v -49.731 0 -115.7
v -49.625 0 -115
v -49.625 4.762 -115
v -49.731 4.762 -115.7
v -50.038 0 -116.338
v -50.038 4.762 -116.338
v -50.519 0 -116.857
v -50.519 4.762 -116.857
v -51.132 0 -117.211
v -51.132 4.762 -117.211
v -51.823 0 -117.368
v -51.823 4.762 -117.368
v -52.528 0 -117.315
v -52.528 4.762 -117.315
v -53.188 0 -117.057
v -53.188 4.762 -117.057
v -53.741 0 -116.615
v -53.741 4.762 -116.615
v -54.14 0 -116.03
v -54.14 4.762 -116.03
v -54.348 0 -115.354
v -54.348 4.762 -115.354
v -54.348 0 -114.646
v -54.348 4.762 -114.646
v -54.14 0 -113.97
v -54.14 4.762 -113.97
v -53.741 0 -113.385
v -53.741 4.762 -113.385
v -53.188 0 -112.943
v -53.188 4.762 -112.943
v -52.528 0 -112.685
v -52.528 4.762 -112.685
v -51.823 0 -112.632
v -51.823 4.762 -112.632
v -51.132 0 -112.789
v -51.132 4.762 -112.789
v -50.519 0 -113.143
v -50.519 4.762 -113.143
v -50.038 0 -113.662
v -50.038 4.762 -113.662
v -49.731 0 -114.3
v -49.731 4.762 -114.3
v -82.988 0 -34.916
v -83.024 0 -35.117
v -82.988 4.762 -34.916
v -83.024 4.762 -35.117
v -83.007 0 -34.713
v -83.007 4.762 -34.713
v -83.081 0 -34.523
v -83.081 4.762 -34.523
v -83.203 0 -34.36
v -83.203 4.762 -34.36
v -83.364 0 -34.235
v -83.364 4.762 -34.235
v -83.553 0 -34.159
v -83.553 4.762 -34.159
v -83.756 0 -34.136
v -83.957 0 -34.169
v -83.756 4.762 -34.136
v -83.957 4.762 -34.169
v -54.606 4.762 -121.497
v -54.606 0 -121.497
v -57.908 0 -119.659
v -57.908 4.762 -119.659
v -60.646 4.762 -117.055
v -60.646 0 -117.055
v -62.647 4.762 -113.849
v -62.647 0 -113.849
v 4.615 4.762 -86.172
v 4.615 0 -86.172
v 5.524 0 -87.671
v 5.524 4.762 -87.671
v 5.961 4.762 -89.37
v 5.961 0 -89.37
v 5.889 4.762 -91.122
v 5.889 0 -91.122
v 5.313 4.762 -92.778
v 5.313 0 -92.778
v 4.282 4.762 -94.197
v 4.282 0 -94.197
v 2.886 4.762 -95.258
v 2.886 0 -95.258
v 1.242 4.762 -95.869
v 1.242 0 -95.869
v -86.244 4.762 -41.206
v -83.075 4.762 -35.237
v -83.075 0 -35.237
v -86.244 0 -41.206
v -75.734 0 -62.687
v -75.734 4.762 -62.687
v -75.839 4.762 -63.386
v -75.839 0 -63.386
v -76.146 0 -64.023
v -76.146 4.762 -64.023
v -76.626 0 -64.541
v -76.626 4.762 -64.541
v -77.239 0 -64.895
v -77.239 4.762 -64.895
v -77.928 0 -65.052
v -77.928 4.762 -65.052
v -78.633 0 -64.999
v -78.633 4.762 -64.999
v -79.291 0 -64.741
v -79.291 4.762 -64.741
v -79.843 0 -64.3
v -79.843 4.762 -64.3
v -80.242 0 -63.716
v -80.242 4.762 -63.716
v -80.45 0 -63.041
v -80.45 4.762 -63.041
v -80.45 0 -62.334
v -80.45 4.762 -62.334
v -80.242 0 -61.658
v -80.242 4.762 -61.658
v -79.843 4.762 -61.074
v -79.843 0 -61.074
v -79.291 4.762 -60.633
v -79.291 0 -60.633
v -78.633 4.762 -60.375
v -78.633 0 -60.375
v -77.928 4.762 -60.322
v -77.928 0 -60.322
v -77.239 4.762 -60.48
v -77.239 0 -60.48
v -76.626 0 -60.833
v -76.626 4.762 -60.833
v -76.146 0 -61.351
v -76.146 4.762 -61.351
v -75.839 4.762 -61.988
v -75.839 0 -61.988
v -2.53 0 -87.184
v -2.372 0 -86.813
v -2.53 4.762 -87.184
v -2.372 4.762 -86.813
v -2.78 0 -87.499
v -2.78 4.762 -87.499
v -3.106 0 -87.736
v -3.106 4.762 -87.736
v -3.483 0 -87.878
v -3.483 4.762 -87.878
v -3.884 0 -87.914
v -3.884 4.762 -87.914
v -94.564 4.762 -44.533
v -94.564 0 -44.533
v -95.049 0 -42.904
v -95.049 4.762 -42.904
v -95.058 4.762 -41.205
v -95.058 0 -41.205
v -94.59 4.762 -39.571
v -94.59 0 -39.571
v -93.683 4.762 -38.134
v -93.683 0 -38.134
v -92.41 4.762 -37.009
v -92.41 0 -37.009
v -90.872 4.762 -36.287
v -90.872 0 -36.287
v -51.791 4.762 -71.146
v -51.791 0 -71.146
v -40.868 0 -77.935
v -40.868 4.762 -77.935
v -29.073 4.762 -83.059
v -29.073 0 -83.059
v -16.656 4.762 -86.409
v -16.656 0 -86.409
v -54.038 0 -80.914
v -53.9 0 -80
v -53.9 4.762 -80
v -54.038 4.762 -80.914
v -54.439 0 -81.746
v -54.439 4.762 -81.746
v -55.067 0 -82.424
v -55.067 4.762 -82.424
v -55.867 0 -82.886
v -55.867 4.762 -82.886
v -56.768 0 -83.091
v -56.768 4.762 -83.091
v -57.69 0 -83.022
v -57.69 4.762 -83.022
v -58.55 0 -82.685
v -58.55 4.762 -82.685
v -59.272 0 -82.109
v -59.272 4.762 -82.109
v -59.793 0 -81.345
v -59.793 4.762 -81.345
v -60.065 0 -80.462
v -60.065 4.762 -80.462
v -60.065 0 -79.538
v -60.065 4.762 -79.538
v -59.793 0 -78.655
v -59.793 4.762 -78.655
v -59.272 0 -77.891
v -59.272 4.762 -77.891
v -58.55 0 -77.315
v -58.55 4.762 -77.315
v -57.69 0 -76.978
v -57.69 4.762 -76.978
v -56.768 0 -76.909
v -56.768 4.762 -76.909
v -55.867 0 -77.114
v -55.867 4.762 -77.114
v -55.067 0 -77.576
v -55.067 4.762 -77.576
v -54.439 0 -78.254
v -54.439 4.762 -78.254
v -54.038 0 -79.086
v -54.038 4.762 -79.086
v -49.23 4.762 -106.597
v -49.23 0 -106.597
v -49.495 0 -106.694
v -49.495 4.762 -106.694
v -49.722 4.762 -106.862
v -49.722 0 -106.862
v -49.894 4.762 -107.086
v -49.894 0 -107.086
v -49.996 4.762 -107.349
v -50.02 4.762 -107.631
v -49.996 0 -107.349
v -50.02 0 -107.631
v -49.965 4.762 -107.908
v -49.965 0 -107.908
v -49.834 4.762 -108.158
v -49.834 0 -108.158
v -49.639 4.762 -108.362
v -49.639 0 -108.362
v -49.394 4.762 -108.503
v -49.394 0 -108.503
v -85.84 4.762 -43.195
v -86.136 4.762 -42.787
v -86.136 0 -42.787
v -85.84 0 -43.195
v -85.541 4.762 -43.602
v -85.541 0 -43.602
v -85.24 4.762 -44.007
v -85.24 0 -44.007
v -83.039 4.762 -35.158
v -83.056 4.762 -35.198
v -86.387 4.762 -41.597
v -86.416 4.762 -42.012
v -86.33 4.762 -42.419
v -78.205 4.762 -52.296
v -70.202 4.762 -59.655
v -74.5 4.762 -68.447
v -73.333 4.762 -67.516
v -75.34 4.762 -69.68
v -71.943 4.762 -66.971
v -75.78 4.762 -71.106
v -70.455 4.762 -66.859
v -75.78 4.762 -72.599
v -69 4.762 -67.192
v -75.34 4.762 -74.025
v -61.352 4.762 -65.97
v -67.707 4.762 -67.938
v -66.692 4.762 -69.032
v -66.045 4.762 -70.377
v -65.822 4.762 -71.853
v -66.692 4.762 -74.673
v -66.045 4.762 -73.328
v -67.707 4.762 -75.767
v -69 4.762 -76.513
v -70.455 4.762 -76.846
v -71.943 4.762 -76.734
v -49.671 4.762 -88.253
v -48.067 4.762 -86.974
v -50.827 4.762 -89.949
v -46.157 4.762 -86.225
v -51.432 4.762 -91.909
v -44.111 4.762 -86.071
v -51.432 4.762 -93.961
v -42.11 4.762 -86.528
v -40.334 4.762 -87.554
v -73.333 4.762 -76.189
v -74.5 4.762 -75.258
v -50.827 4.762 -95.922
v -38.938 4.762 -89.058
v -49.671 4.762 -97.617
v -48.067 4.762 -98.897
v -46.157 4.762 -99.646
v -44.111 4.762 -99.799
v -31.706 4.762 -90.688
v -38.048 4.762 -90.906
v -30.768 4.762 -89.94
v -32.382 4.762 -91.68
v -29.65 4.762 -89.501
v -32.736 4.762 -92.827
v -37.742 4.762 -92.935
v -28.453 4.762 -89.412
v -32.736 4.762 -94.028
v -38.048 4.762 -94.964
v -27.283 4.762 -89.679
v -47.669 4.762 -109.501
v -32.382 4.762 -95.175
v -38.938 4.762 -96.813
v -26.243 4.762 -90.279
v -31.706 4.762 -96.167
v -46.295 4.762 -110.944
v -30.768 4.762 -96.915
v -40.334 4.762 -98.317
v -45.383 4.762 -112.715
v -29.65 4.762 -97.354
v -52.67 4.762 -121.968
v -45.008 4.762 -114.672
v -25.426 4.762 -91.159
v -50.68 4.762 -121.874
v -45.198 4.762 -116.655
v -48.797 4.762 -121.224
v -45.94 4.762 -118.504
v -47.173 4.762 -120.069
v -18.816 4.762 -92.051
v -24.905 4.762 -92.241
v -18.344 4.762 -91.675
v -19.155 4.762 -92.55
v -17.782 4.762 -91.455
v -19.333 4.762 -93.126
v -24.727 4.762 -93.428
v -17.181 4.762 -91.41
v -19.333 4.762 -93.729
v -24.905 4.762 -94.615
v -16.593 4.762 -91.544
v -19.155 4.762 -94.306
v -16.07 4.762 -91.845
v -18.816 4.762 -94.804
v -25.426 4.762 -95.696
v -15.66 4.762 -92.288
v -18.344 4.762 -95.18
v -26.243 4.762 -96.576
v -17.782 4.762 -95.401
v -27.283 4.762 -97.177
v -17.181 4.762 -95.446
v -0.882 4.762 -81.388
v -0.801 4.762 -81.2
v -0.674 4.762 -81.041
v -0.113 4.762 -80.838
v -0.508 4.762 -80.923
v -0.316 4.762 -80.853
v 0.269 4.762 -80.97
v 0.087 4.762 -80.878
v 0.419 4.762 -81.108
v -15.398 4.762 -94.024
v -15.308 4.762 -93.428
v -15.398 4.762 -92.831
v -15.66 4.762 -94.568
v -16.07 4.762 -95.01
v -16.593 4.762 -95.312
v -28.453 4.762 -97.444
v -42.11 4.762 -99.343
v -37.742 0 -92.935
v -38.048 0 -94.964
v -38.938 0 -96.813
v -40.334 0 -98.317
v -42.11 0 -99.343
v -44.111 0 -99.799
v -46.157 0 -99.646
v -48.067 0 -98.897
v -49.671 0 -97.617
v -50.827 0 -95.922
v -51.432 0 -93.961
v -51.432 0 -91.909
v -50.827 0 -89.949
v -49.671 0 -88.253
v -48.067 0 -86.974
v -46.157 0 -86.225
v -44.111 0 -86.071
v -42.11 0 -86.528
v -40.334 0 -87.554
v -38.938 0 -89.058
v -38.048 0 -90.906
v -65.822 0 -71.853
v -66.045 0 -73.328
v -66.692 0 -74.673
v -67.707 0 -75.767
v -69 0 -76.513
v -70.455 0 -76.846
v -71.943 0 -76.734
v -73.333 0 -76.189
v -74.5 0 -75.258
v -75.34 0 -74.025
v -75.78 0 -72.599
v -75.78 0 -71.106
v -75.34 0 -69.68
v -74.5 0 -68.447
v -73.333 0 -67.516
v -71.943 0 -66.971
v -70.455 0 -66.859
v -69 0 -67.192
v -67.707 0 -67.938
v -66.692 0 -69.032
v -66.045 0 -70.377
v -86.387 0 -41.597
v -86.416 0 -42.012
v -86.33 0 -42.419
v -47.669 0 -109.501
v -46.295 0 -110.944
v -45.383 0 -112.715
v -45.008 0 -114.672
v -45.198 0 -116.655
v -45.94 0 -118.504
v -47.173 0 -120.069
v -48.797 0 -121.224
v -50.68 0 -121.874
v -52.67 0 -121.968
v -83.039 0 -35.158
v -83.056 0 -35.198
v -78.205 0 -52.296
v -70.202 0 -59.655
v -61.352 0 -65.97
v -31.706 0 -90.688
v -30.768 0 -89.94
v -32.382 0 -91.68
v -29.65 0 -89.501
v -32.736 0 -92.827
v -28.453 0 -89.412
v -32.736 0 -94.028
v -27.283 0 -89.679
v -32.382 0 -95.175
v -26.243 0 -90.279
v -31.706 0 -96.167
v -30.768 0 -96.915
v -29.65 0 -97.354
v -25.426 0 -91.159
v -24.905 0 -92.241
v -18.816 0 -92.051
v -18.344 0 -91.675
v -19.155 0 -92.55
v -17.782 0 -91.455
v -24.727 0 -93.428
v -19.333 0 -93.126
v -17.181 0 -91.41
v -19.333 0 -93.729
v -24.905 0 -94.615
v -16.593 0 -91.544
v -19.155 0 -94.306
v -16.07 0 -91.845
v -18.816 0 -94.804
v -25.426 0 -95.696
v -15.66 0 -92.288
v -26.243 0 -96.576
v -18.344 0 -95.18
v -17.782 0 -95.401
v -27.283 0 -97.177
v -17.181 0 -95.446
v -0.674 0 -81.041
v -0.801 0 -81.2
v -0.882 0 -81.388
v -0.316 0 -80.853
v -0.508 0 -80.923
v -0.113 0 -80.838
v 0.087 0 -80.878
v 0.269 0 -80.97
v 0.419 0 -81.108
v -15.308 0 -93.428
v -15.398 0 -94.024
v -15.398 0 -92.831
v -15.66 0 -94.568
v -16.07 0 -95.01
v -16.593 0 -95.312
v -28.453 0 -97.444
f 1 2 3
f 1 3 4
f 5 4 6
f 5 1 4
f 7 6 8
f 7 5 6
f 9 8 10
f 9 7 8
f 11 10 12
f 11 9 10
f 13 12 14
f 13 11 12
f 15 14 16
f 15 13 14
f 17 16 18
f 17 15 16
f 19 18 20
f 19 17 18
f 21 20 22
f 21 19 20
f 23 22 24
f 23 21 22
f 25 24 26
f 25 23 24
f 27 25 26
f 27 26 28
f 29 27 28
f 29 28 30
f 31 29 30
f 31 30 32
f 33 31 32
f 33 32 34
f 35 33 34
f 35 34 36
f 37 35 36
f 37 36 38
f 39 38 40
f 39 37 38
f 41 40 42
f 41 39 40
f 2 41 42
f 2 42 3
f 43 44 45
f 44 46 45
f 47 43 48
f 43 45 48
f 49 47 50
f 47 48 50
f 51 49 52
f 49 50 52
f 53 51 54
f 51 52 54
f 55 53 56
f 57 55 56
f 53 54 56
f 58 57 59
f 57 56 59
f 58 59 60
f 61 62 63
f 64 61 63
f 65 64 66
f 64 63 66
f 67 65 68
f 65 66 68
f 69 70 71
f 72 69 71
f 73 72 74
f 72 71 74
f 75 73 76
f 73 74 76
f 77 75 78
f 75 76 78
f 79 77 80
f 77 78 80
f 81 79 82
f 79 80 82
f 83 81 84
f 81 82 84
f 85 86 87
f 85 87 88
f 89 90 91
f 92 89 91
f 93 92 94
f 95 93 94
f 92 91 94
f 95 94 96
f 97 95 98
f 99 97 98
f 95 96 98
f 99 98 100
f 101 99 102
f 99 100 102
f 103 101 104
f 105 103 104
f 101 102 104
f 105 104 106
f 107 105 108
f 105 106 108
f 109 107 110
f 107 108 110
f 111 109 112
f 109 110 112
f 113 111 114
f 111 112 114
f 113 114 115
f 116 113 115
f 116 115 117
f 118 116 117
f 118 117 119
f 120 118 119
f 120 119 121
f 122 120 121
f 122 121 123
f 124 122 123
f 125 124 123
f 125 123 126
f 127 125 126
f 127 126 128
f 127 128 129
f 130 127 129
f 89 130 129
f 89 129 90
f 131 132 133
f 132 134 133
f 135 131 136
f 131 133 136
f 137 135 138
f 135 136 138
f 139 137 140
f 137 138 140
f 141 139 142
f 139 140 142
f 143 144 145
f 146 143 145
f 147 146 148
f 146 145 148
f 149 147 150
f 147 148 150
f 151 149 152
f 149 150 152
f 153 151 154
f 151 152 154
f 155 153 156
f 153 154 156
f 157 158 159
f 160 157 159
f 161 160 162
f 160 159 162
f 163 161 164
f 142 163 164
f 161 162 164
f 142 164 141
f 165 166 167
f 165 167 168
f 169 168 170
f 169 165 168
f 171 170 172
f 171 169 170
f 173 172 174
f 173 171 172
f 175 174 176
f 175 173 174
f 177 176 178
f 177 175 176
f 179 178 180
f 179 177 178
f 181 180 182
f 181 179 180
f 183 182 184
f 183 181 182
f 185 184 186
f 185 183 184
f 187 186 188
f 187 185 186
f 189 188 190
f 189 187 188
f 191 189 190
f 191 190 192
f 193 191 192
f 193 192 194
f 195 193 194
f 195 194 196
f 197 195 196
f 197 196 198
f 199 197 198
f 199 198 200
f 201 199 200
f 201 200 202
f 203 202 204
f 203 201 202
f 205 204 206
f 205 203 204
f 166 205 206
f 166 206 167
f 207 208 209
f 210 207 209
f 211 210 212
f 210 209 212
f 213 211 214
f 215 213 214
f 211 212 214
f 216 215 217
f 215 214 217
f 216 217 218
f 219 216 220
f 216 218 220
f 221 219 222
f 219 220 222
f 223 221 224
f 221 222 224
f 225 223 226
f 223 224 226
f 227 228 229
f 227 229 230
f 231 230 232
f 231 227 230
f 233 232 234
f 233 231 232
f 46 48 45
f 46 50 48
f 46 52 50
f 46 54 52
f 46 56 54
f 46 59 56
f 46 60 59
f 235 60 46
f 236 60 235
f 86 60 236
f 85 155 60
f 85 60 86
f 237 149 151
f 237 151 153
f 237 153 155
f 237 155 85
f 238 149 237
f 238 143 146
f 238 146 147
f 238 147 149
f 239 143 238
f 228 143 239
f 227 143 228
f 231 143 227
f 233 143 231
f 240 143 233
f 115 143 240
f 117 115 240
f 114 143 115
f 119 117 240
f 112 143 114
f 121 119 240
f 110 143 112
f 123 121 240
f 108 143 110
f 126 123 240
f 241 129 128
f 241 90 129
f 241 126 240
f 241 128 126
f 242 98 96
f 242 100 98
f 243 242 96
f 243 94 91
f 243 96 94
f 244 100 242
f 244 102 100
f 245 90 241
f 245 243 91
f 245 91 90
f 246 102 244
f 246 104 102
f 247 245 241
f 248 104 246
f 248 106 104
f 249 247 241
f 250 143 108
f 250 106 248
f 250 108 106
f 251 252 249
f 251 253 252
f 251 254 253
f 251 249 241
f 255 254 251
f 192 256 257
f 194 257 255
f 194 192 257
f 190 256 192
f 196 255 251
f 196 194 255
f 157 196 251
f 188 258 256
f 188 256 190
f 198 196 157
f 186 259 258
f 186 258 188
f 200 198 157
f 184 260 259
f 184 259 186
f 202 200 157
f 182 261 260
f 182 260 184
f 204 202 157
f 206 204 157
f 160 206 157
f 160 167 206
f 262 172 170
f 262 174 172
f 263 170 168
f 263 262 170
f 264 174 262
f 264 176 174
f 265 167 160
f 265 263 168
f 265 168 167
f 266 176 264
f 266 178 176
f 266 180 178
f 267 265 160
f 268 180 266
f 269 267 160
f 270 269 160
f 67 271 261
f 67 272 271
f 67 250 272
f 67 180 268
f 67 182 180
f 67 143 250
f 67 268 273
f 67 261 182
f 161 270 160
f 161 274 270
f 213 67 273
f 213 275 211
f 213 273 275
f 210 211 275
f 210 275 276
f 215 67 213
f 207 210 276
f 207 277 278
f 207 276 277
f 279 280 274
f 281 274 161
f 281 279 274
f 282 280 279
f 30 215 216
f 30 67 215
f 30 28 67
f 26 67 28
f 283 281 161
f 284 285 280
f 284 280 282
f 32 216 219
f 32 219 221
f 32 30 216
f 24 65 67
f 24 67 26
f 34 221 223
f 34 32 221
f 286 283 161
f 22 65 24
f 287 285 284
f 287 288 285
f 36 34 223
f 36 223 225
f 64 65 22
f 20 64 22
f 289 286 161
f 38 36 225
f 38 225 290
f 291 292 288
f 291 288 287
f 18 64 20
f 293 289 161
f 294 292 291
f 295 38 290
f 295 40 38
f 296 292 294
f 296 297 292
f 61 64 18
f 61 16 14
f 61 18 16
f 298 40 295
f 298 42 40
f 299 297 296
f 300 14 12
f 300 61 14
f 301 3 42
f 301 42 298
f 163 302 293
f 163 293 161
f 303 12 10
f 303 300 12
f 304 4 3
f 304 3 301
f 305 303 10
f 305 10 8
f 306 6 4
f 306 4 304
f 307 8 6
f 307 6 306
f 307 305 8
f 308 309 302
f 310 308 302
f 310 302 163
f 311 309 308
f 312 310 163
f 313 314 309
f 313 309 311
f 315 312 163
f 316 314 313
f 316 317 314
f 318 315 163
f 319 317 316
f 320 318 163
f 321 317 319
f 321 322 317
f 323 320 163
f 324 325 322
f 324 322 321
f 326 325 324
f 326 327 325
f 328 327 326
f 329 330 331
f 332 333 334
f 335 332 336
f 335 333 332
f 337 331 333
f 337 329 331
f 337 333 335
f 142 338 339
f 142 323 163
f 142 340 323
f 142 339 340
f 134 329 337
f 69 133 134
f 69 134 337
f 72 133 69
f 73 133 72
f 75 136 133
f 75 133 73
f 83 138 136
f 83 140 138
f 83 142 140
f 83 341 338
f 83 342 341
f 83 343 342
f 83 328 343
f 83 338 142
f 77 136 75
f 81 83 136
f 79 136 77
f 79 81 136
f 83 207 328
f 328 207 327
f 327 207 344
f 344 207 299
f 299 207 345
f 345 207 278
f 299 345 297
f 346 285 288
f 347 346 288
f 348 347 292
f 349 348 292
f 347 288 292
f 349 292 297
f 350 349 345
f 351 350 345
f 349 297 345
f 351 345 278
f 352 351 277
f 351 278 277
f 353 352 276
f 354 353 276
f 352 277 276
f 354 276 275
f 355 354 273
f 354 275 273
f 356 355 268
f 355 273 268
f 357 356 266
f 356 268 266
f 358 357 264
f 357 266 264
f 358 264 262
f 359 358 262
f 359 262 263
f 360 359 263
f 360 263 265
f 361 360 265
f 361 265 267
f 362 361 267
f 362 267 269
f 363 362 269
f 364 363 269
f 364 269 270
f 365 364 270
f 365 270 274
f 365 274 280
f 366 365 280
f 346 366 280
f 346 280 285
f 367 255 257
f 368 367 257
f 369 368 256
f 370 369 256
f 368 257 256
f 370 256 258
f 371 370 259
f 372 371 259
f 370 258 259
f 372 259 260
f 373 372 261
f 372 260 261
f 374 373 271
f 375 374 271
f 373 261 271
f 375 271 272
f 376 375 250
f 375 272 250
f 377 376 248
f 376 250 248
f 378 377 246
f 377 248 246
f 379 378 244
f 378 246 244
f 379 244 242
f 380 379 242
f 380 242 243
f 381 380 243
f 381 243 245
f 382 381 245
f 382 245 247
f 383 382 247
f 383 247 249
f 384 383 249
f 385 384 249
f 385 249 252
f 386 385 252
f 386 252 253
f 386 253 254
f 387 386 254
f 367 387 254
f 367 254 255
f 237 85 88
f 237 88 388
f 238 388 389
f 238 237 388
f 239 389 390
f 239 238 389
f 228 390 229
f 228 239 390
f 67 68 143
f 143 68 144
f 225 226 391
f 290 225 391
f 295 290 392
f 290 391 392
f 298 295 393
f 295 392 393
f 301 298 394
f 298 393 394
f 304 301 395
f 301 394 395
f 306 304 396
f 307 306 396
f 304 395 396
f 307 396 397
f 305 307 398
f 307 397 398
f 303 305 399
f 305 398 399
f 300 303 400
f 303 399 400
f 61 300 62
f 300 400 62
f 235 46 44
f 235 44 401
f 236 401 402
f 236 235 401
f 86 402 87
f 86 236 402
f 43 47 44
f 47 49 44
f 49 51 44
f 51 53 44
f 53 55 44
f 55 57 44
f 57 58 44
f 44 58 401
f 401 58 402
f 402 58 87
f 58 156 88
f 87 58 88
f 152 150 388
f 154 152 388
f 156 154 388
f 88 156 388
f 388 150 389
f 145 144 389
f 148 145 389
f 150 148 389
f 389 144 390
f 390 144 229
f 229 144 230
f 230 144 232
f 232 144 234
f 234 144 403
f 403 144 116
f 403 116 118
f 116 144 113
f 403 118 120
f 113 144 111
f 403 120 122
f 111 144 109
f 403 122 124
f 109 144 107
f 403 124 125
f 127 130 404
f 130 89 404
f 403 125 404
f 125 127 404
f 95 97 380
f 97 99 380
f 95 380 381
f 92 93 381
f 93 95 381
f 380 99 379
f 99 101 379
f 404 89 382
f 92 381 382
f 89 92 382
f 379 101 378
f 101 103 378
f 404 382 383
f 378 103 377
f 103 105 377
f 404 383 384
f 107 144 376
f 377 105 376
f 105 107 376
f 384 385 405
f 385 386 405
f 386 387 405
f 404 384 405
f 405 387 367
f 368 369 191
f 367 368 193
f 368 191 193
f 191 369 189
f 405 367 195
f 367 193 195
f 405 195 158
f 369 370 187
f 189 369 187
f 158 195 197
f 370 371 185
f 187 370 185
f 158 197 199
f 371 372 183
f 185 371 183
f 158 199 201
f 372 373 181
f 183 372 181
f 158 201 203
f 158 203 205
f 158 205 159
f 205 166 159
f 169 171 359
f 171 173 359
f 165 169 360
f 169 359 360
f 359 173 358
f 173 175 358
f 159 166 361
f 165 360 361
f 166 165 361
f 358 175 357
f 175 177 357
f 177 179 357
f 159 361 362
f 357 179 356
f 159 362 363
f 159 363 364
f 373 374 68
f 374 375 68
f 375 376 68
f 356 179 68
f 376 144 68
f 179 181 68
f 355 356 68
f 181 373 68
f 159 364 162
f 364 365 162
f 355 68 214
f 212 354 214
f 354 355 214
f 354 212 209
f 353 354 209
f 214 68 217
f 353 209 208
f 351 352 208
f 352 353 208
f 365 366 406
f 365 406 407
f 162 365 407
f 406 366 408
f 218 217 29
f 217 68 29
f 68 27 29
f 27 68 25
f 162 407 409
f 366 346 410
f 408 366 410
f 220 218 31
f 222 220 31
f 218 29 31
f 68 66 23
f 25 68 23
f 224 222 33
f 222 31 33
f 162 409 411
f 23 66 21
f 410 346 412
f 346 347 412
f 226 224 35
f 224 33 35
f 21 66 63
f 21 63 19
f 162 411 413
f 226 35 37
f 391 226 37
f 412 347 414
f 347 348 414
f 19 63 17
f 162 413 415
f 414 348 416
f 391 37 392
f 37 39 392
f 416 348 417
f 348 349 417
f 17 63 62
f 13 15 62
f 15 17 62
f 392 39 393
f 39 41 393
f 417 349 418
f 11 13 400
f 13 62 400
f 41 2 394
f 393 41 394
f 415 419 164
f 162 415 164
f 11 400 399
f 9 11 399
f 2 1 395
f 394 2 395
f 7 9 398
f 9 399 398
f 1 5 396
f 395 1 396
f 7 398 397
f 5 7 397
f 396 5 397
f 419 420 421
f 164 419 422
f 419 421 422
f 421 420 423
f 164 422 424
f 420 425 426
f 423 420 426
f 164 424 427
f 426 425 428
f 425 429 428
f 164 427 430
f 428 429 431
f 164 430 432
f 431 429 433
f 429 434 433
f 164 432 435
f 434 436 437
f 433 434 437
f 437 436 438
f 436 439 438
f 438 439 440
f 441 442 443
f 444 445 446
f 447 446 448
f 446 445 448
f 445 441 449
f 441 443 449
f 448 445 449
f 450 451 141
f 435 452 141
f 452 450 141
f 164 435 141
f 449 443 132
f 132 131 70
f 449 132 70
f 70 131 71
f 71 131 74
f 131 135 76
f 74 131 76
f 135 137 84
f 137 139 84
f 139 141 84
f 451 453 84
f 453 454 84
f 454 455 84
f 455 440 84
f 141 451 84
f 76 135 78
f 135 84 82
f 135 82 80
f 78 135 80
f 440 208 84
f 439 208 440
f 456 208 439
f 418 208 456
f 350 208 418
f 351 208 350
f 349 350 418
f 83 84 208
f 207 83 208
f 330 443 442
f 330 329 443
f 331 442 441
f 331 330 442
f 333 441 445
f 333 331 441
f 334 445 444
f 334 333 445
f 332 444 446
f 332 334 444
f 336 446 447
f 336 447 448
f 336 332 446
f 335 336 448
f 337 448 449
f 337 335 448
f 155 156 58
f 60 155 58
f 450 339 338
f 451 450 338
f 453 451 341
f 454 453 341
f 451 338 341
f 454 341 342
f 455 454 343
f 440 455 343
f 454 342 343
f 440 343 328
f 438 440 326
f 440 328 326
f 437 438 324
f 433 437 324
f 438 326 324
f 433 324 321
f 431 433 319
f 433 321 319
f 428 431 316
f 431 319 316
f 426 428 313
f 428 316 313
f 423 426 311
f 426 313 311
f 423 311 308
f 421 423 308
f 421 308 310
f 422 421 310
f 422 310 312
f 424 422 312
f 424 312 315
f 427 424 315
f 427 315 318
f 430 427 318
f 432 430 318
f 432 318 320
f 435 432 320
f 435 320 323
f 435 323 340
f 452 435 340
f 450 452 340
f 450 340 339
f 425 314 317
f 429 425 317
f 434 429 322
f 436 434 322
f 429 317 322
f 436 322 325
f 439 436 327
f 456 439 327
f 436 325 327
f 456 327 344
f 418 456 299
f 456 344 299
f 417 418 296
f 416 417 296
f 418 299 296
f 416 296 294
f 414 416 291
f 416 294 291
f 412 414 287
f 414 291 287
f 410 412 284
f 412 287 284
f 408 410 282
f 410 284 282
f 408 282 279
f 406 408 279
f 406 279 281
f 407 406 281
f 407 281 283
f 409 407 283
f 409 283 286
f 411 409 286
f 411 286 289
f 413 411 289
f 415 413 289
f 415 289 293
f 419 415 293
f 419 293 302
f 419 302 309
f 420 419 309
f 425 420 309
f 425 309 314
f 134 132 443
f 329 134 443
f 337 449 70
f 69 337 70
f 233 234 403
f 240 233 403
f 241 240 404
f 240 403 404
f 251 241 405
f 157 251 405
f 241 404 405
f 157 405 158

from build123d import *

# Parameters (mm, degrees)
SKETCH1_R           = 3.1
SKETCH1_R_2         = 2.375
BOSS_EXTRUDE1_DEPTH = 4.7625
FILLET1_R           = 0.75
FILLET2_R           = 1.5
CUT_EXTRUDE1_DEPTH  = 5.7625
SKETCH3_R           = 6.883378158
SKETCH3_R_2         = 4.027347077
SKETCH3_R_3         = 2.023736097
SKETCH3_R_4         = 5.007052744
SKETCH3_R_5         = 2.371370049
CUT_EXTRUDE2_DEPTH  = 5.7625


with BuildPart() as part:
    # Sketch1 → Boss-Extrude1 (new body)
    with BuildSketch(Plane(origin=(0, 0, 0), x_dir=(1, 0, 0), z_dir=(0, 1, 0))):
        with BuildLine():
            Line((-2.686438344, 87.958985039), (-0.5, 79.998437485))
            Line((-0.5, 79.998437485), (4.614887054, 86.172076174))
            ThreePointArc((4.614887054, 86.172076174), (5.661584951, 91.971127787), (1.242075777, 95.868885443))
            Line((1.242075777, 95.868885443), (-49.229512188, 106.596952642))
            ThreePointArc((-49.229512188, 106.596952642), (-50.017902784, 107.489183117), (-49.393900435, 108.503212713))
            ThreePointArc((-49.393900435, 108.503212713), (-45.503212713, 117.606099565), (-54.606099565, 121.496787287))
            ThreePointArc((-54.606099565, 121.496787287), (-59.359536161, 118.443728777), (-62.646533103, 113.84895165))
            Line((-62.646533103, 113.84895165), (-94.564318795, 44.533048109))
            ThreePointArc((-94.564318795, 44.533048109), (-94.590381999, 39.571360115), (-90.871592859, 36.28660223))
            Line((-90.871592859, 36.28660223), (-82.579358815, 33.74664323))
            Line((-82.579358815, 33.74664323), (-85.704155619, 43.38101369))
            ThreePointArc((-85.704155619, 43.38101369), (-70.503668965, 59.408545121), (-51.790728612, 71.145768882))
            ThreePointArc((-51.790728612, 71.145768882), (-28.506341212, 83.254960878), (-2.686438344, 87.958985039))
        make_face()
        with Locations((-57, 80)):
            Circle(SKETCH1_R, mode=Mode.SUBTRACT)
        with Locations((-52, 115)):
            Circle(SKETCH1_R_2, mode=Mode.SUBTRACT)
    extrude(amount=BOSS_EXTRUDE1_DEPTH)

    # Fillet1
    fillet1_edges = [part.edges().sort_by_distance(p)[0] for p in [
        (-82.579358815, 2.38125, -33.74664323),
        (-0.5, 2.38125, -79.998437485),
    ]]
    fillet(fillet1_edges, radius=FILLET1_R)

    # Fillet2
    fillet2_edges = [part.edges().sort_by_distance(p)[0] for p in [
        (-85.704155619, 2.38125, -43.38101369),
        (-2.686438344, 2.38125, -87.958985039),
    ]]
    fillet(fillet2_edges, radius=FILLET2_R)

    # Sketch2 → Cut-Extrude1 (cut, through all)
    with BuildSketch(Plane(origin=(0, 4.7625, 0), x_dir=(1, 0, 0), z_dir=(0, 1, 0))):
        with BuildLine():
            Line((-83.074868749, 35.237466844), (-86.244425002, 41.206104458))
            ThreePointArc((-86.244425002, 41.206104458), (-86.416137903, 42.011960676), (-86.136312483, 42.786936353))
            ThreePointArc((-86.136312483, 42.786936353), (-85.690987138, 43.398953447), (-85.240414354, 44.007117694))
            Line((-85.240414354, 44.007117694), (-83.023850343, 35.117099074))
            ThreePointArc((-83.023850343, 35.117099074), (-83.046731861, 35.178396715), (-83.074868749, 35.237466844))
        make_face()
    extrude(amount=-CUT_EXTRUDE1_DEPTH, mode=Mode.SUBTRACT)

    # Sketch3 → Cut-Extrude2 (cut, through all)
    with BuildSketch(Plane(origin=(0, 4.7625, 0), x_dir=(1, 0, 0), z_dir=(0, 1, 0))):
        with Locations((-44.625253906, 92.935332876)):
            Circle(SKETCH3_R)
        with Locations((-28.753871163, 93.427681096)):
            Circle(SKETCH3_R_2)
        with Locations((-17.332089479, 93.427681096)):
            Circle(SKETCH3_R_3)
        with Locations((-70.829162085, 71.852500768)):
            Circle(SKETCH3_R_4)
        with Locations((-78.10497123, 62.687125815)):
            Circle(SKETCH3_R_5)
    extrude(amount=-CUT_EXTRUDE2_DEPTH, mode=Mode.SUBTRACT)


solid = part.part
